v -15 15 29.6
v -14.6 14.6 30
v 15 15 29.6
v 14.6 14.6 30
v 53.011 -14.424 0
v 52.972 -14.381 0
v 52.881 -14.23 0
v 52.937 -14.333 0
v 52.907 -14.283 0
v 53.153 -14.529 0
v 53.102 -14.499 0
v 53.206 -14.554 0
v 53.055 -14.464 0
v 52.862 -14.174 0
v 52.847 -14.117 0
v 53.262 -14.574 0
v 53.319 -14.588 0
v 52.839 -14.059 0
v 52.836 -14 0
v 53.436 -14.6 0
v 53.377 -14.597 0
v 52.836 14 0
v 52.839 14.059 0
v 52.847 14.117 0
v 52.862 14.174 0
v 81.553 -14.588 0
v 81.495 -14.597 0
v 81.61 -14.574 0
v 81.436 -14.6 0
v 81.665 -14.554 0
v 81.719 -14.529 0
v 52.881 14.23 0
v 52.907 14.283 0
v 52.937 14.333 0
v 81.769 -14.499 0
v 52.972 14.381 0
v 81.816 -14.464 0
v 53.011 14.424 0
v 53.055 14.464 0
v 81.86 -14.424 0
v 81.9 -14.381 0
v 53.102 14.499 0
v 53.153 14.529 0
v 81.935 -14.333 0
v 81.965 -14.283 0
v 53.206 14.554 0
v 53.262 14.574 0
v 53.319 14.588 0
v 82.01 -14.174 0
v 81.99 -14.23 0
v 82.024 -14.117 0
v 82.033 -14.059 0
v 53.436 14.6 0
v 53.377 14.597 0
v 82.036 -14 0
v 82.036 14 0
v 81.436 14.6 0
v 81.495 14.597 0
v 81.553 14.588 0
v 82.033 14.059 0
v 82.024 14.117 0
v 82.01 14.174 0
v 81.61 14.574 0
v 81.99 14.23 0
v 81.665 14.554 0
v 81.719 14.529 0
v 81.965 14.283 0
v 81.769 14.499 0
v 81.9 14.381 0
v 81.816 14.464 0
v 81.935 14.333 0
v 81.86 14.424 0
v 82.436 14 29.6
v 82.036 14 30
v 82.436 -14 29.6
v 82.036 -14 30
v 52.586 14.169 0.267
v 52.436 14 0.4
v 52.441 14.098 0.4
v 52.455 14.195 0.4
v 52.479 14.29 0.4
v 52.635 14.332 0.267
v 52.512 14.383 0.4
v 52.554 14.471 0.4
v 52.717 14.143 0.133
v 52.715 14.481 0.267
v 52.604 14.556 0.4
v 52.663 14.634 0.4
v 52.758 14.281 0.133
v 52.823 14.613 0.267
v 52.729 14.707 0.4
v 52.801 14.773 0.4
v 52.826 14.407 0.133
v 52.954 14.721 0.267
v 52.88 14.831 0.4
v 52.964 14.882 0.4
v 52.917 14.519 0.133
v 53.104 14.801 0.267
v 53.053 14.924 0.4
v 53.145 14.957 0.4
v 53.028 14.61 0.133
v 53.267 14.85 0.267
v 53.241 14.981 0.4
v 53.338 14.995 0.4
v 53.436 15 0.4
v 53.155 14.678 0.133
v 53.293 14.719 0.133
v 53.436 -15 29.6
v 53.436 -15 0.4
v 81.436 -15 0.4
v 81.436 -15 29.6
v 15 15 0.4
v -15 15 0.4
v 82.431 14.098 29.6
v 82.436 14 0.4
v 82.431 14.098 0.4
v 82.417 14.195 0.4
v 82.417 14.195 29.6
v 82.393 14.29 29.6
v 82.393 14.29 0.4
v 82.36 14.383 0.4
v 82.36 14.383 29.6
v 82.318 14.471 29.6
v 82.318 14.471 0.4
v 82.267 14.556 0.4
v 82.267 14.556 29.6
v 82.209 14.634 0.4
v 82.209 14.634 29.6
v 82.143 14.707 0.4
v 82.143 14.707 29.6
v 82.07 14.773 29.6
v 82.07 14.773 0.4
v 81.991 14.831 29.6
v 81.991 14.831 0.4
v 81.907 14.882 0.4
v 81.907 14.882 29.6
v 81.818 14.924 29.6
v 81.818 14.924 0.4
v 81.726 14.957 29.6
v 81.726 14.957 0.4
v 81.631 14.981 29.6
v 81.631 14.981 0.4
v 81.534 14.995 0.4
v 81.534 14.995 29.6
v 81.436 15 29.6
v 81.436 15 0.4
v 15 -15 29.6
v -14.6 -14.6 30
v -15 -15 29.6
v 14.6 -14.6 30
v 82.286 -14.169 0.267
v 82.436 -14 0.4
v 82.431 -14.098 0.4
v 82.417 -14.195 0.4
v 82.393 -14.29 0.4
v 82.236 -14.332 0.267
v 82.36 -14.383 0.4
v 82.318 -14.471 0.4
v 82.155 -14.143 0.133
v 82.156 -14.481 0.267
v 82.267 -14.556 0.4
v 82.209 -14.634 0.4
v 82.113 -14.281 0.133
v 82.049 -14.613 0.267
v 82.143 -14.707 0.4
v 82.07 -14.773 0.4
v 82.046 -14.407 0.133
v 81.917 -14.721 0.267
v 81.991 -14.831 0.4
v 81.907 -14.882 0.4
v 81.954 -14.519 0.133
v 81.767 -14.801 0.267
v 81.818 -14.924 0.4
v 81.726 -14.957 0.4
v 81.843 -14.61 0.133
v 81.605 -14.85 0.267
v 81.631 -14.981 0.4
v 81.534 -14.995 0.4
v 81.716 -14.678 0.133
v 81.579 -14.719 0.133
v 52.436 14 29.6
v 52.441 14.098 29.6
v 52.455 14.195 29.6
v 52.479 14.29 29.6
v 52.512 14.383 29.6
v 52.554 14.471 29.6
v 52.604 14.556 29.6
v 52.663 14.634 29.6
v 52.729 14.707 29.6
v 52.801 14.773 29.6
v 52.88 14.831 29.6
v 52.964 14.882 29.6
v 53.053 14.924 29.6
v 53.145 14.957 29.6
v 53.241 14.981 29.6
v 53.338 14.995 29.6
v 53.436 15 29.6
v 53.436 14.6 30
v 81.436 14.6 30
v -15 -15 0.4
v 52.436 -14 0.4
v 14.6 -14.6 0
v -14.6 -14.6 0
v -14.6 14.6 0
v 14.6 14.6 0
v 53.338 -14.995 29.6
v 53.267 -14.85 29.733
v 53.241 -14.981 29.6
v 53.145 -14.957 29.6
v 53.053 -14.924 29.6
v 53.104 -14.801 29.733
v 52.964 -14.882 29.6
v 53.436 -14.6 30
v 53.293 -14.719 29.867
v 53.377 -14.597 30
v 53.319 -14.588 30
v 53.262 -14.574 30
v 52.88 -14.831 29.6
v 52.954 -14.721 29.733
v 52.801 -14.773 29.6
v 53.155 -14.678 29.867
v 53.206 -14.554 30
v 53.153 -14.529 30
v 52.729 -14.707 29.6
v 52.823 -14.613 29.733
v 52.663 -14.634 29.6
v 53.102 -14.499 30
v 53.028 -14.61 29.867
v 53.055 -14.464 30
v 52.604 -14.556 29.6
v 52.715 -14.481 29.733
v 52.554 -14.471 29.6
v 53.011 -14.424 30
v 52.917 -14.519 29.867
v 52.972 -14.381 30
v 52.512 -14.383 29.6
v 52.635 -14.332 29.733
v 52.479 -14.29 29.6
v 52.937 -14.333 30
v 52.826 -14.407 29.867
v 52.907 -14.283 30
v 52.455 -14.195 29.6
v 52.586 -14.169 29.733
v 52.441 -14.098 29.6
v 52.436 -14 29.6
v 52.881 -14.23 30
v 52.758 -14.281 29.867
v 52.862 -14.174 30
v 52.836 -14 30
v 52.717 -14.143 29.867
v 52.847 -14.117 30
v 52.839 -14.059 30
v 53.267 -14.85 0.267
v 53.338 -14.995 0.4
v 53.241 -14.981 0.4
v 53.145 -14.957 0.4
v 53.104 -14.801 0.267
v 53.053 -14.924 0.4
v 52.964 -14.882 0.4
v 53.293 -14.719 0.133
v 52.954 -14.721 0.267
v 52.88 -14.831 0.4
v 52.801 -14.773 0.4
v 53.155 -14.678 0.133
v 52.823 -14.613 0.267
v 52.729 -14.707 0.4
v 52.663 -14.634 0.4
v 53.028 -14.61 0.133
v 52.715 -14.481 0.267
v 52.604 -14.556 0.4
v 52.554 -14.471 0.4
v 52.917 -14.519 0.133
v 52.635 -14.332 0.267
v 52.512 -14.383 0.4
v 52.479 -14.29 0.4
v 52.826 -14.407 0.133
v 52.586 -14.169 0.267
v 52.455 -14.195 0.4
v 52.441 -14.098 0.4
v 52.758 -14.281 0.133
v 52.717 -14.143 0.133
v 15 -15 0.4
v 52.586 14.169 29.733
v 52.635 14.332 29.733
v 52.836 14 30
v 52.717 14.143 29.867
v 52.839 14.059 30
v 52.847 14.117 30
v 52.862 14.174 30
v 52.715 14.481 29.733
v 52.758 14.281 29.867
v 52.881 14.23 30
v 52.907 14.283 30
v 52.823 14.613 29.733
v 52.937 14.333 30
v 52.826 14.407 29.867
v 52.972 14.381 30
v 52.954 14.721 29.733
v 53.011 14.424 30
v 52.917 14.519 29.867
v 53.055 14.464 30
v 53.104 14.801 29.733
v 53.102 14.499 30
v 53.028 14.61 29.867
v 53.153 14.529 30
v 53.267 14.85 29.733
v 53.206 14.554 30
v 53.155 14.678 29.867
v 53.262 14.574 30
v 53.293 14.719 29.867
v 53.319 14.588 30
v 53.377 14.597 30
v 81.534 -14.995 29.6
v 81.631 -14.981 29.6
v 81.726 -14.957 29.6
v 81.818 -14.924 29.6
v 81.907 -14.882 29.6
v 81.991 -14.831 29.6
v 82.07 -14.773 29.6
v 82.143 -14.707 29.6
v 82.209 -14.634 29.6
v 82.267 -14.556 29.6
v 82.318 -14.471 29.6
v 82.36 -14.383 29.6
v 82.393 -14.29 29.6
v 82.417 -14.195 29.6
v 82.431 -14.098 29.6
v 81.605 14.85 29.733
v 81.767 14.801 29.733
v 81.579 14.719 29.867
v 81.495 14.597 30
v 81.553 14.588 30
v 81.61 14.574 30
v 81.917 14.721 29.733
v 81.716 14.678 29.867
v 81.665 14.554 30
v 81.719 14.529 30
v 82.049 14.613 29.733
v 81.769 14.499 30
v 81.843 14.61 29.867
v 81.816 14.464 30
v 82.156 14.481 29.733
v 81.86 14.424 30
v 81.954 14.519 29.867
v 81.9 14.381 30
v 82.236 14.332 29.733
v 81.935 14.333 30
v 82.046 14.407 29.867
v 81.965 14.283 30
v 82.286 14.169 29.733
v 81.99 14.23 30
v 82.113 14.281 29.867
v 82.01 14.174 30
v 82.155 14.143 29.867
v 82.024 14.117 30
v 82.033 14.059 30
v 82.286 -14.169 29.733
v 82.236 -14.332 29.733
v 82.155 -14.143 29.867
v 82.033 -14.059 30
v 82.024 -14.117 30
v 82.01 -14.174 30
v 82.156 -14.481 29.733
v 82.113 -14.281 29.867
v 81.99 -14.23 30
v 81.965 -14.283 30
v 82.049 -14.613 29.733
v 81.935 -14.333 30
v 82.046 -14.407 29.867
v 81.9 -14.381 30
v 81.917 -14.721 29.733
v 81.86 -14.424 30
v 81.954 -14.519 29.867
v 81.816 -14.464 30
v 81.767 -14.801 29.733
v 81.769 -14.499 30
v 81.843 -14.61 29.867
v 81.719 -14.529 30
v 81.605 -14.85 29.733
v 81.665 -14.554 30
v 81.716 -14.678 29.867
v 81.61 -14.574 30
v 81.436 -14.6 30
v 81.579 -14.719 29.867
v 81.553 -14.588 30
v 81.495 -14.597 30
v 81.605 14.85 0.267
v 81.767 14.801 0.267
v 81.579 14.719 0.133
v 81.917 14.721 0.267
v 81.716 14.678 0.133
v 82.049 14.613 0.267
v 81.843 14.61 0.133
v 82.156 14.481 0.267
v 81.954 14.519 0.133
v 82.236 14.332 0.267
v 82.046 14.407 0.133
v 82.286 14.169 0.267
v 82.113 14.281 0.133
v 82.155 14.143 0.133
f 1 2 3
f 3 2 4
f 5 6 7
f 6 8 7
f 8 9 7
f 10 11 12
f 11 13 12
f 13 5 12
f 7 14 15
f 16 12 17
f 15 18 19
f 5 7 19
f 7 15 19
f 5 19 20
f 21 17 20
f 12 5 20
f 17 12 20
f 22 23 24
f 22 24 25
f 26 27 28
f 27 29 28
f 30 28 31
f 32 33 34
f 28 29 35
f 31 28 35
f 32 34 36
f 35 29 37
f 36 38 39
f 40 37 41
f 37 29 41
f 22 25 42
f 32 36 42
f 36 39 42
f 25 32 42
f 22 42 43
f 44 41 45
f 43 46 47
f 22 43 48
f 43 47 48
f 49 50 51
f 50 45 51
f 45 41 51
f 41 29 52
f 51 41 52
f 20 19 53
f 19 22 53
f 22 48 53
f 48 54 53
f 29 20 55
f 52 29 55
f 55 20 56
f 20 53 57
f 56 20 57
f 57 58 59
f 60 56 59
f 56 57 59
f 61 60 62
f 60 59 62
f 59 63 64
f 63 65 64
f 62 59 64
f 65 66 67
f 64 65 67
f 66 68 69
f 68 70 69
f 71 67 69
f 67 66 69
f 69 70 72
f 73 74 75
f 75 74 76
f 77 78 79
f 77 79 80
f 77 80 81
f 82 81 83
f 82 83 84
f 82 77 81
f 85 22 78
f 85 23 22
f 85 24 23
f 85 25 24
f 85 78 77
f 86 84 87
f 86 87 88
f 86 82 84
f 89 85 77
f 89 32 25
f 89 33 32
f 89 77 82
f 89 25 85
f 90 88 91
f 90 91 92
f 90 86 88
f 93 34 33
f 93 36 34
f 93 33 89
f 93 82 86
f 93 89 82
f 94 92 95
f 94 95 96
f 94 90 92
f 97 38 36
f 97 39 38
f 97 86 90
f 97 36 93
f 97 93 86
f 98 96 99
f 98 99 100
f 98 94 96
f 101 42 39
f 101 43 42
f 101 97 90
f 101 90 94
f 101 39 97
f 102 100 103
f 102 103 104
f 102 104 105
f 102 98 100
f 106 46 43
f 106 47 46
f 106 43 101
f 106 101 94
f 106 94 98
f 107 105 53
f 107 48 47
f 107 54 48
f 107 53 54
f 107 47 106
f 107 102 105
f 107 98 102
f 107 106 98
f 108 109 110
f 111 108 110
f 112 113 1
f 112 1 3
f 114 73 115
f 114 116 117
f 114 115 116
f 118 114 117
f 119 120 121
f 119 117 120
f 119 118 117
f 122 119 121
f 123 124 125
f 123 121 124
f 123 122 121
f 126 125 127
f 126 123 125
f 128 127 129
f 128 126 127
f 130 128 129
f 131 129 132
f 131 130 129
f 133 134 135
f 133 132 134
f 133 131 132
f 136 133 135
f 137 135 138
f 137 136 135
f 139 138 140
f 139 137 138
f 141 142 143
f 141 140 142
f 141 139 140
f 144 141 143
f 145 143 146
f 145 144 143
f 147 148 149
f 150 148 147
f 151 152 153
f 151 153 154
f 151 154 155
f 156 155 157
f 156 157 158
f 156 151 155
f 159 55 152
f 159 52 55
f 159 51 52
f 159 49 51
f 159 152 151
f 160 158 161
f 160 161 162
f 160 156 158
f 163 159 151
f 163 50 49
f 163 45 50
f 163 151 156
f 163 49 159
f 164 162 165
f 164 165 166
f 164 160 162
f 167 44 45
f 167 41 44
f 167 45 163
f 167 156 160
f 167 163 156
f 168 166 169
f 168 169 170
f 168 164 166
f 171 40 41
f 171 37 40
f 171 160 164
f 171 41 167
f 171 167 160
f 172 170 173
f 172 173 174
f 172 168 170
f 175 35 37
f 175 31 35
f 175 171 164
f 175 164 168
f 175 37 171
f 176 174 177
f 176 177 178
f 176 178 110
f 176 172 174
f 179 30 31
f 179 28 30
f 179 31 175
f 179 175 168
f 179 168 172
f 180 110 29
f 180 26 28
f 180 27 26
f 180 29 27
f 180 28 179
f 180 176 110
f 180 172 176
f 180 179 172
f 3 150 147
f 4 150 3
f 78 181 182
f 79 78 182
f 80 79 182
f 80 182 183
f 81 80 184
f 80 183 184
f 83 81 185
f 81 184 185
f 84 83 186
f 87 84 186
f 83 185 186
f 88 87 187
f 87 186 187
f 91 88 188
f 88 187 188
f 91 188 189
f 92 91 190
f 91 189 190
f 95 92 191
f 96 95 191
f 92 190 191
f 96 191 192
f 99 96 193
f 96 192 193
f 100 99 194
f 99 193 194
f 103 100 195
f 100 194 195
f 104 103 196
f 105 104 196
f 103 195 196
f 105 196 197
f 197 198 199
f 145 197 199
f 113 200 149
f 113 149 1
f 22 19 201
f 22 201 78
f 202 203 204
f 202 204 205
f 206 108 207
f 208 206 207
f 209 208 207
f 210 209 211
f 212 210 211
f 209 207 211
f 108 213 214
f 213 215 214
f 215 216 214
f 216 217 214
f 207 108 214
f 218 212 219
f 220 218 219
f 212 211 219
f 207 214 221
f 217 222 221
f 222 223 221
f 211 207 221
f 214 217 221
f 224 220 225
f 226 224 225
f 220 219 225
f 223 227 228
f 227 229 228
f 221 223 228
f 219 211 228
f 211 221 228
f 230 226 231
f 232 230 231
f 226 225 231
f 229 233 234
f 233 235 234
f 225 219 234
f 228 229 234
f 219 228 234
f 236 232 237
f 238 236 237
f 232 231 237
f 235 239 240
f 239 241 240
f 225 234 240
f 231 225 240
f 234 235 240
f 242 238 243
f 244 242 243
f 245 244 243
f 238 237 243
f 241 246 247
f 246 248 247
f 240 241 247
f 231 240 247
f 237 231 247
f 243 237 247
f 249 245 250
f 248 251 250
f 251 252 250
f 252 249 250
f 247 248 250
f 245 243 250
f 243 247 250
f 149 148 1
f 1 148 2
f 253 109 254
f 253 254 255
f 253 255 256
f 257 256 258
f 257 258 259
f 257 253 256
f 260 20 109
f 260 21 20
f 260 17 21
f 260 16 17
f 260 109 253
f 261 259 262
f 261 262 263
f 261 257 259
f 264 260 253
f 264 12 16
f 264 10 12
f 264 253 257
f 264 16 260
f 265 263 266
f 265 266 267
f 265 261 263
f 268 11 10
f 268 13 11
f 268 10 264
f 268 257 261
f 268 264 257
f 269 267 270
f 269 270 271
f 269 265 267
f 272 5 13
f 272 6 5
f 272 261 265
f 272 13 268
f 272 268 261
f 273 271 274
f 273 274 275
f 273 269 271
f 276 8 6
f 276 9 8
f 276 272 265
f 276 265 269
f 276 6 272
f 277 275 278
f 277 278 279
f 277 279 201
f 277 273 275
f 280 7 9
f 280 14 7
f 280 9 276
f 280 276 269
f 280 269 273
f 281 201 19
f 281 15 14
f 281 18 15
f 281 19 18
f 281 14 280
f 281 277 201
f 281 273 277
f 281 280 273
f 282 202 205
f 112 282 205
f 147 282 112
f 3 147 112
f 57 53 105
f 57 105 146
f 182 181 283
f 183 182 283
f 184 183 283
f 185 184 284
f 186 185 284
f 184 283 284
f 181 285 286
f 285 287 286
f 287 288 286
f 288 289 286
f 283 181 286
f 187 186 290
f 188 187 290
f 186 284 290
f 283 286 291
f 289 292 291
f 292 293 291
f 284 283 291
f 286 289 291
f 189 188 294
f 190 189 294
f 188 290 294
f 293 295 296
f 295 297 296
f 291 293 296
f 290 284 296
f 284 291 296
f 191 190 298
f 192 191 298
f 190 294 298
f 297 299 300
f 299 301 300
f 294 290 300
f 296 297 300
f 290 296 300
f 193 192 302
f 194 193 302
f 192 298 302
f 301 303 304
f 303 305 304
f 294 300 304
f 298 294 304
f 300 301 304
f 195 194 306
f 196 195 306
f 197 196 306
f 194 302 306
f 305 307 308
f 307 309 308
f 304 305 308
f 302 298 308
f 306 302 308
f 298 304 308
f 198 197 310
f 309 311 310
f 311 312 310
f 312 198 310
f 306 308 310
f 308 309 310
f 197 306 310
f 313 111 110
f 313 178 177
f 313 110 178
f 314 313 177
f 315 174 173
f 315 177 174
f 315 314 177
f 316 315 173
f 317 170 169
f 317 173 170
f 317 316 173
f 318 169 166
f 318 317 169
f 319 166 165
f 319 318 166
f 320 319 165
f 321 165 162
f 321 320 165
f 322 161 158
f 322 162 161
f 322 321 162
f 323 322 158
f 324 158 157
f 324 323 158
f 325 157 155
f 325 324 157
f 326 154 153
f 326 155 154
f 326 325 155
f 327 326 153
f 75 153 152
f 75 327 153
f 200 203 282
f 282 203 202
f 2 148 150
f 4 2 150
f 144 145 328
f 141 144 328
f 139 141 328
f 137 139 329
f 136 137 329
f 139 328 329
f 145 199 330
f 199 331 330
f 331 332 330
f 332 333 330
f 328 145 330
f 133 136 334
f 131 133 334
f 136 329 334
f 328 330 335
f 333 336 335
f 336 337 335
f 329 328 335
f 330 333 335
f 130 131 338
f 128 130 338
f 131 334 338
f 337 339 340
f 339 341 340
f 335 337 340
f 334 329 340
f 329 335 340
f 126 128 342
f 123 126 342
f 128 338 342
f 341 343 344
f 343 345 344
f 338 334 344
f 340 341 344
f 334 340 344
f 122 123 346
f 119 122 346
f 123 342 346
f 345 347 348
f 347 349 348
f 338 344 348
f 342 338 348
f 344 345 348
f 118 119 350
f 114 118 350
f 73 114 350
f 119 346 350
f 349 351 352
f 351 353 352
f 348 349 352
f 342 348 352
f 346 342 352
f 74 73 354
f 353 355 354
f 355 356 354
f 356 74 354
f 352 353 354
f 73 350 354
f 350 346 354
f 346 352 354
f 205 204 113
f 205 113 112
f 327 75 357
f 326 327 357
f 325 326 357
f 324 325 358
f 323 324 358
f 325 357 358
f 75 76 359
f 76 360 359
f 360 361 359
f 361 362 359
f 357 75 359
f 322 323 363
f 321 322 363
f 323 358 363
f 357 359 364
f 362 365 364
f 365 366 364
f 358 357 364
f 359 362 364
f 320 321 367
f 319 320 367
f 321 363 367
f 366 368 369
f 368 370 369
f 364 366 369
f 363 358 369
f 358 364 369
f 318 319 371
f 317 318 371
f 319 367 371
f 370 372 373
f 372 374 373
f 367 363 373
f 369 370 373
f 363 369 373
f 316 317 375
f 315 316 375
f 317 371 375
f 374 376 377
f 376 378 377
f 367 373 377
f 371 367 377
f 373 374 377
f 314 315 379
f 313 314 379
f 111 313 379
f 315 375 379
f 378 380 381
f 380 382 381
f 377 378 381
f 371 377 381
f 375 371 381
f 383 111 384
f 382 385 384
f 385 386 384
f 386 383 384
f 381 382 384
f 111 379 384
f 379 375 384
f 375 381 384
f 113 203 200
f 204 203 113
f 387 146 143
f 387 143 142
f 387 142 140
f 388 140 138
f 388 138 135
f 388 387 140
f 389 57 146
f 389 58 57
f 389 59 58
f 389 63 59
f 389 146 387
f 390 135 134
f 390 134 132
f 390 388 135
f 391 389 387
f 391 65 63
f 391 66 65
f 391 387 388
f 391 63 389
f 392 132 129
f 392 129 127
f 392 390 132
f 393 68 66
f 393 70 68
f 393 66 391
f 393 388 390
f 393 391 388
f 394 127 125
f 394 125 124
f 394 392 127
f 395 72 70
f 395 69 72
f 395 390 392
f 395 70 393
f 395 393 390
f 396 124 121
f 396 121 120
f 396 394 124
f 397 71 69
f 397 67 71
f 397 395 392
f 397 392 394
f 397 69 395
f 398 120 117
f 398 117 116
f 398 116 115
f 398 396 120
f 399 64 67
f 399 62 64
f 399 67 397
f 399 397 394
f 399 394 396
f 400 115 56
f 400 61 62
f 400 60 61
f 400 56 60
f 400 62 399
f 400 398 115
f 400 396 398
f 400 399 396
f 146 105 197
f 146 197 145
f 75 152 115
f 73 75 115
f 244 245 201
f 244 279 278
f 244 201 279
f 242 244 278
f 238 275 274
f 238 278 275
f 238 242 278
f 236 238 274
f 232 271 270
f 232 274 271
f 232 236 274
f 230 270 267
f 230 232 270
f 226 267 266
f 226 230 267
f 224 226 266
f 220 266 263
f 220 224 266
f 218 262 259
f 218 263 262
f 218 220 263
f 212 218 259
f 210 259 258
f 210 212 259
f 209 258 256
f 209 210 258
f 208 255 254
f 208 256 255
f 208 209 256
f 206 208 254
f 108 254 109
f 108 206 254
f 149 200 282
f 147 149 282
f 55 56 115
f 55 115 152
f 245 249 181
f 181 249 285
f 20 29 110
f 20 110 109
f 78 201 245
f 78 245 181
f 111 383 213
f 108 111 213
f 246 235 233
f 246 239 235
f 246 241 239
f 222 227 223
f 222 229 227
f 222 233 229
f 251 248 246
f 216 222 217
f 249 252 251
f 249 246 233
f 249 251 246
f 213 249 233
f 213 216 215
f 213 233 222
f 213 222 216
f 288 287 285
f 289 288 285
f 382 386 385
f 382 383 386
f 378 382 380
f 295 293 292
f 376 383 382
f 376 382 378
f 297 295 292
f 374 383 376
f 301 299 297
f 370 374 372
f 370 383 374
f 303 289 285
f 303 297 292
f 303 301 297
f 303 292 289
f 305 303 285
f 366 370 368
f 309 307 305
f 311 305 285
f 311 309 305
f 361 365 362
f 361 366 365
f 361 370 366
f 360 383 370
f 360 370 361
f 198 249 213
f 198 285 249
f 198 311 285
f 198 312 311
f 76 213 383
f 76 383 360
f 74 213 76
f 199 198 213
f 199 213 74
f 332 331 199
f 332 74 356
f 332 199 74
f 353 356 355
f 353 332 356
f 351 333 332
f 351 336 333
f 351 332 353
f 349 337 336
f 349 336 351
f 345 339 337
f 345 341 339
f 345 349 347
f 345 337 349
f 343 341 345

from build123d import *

# Parameters (mm, degrees)
F0_W     = 30
F0_H     = 30
F1_DEPTH = 30
F2_R     = 1
F3_SIZE  = 0.4


with BuildPart() as f1:
    # F0 (on Top) → F1 (new body)
    with BuildSketch(Plane.XY):
        with Locations((67.435756, 0)):
            Rectangle(F0_W, F0_H)
        Rectangle(F0_W, F0_H)
    extrude(amount=F1_DEPTH)

    # F2
    f2_edges = [f1.edges().sort_by_distance(p)[0] for p in [
        (52.435756, -15, 15),
        (82.435756, -15, 15),
        (82.435756, 15, 15),
        (52.435756, 15, 15),
    ]]
    fillet(f2_edges, radius=F2_R)

    # F3
    f3_edges = [f1.edges().sort_by_distance(p)[0] for p in [
        (-15, 0, 30),
        (0, -15, 30),
        (15, 0, 30),
        (0, 15, 30),
        (52.435756, 0, 30),
        (52.72865, 14.707107, 30),
        (52.72865, -14.707107, 30),
        (67.435756, 15, 30),
        (67.435756, -15, 30),
        (82.142863, 14.707107, 30),
        (82.142863, -14.707107, 30),
        (82.435756, 0, 30),
        (52.435756, 0, 0),
        (52.72865, 14.707107, 0),
        (52.72865, -14.707107, 0),
        (67.435756, 15, 0),
        (67.435756, -15, 0),
        (82.142863, 14.707107, 0),
        (82.142863, -14.707107, 0),
        (82.435756, 0, 0),
        (-15, 0, 0),
        (0, -15, 0),
        (15, 0, 0),
        (0, 15, 0),
    ]]
    chamfer(f3_edges, length=F3_SIZE)


solid = f1.part
